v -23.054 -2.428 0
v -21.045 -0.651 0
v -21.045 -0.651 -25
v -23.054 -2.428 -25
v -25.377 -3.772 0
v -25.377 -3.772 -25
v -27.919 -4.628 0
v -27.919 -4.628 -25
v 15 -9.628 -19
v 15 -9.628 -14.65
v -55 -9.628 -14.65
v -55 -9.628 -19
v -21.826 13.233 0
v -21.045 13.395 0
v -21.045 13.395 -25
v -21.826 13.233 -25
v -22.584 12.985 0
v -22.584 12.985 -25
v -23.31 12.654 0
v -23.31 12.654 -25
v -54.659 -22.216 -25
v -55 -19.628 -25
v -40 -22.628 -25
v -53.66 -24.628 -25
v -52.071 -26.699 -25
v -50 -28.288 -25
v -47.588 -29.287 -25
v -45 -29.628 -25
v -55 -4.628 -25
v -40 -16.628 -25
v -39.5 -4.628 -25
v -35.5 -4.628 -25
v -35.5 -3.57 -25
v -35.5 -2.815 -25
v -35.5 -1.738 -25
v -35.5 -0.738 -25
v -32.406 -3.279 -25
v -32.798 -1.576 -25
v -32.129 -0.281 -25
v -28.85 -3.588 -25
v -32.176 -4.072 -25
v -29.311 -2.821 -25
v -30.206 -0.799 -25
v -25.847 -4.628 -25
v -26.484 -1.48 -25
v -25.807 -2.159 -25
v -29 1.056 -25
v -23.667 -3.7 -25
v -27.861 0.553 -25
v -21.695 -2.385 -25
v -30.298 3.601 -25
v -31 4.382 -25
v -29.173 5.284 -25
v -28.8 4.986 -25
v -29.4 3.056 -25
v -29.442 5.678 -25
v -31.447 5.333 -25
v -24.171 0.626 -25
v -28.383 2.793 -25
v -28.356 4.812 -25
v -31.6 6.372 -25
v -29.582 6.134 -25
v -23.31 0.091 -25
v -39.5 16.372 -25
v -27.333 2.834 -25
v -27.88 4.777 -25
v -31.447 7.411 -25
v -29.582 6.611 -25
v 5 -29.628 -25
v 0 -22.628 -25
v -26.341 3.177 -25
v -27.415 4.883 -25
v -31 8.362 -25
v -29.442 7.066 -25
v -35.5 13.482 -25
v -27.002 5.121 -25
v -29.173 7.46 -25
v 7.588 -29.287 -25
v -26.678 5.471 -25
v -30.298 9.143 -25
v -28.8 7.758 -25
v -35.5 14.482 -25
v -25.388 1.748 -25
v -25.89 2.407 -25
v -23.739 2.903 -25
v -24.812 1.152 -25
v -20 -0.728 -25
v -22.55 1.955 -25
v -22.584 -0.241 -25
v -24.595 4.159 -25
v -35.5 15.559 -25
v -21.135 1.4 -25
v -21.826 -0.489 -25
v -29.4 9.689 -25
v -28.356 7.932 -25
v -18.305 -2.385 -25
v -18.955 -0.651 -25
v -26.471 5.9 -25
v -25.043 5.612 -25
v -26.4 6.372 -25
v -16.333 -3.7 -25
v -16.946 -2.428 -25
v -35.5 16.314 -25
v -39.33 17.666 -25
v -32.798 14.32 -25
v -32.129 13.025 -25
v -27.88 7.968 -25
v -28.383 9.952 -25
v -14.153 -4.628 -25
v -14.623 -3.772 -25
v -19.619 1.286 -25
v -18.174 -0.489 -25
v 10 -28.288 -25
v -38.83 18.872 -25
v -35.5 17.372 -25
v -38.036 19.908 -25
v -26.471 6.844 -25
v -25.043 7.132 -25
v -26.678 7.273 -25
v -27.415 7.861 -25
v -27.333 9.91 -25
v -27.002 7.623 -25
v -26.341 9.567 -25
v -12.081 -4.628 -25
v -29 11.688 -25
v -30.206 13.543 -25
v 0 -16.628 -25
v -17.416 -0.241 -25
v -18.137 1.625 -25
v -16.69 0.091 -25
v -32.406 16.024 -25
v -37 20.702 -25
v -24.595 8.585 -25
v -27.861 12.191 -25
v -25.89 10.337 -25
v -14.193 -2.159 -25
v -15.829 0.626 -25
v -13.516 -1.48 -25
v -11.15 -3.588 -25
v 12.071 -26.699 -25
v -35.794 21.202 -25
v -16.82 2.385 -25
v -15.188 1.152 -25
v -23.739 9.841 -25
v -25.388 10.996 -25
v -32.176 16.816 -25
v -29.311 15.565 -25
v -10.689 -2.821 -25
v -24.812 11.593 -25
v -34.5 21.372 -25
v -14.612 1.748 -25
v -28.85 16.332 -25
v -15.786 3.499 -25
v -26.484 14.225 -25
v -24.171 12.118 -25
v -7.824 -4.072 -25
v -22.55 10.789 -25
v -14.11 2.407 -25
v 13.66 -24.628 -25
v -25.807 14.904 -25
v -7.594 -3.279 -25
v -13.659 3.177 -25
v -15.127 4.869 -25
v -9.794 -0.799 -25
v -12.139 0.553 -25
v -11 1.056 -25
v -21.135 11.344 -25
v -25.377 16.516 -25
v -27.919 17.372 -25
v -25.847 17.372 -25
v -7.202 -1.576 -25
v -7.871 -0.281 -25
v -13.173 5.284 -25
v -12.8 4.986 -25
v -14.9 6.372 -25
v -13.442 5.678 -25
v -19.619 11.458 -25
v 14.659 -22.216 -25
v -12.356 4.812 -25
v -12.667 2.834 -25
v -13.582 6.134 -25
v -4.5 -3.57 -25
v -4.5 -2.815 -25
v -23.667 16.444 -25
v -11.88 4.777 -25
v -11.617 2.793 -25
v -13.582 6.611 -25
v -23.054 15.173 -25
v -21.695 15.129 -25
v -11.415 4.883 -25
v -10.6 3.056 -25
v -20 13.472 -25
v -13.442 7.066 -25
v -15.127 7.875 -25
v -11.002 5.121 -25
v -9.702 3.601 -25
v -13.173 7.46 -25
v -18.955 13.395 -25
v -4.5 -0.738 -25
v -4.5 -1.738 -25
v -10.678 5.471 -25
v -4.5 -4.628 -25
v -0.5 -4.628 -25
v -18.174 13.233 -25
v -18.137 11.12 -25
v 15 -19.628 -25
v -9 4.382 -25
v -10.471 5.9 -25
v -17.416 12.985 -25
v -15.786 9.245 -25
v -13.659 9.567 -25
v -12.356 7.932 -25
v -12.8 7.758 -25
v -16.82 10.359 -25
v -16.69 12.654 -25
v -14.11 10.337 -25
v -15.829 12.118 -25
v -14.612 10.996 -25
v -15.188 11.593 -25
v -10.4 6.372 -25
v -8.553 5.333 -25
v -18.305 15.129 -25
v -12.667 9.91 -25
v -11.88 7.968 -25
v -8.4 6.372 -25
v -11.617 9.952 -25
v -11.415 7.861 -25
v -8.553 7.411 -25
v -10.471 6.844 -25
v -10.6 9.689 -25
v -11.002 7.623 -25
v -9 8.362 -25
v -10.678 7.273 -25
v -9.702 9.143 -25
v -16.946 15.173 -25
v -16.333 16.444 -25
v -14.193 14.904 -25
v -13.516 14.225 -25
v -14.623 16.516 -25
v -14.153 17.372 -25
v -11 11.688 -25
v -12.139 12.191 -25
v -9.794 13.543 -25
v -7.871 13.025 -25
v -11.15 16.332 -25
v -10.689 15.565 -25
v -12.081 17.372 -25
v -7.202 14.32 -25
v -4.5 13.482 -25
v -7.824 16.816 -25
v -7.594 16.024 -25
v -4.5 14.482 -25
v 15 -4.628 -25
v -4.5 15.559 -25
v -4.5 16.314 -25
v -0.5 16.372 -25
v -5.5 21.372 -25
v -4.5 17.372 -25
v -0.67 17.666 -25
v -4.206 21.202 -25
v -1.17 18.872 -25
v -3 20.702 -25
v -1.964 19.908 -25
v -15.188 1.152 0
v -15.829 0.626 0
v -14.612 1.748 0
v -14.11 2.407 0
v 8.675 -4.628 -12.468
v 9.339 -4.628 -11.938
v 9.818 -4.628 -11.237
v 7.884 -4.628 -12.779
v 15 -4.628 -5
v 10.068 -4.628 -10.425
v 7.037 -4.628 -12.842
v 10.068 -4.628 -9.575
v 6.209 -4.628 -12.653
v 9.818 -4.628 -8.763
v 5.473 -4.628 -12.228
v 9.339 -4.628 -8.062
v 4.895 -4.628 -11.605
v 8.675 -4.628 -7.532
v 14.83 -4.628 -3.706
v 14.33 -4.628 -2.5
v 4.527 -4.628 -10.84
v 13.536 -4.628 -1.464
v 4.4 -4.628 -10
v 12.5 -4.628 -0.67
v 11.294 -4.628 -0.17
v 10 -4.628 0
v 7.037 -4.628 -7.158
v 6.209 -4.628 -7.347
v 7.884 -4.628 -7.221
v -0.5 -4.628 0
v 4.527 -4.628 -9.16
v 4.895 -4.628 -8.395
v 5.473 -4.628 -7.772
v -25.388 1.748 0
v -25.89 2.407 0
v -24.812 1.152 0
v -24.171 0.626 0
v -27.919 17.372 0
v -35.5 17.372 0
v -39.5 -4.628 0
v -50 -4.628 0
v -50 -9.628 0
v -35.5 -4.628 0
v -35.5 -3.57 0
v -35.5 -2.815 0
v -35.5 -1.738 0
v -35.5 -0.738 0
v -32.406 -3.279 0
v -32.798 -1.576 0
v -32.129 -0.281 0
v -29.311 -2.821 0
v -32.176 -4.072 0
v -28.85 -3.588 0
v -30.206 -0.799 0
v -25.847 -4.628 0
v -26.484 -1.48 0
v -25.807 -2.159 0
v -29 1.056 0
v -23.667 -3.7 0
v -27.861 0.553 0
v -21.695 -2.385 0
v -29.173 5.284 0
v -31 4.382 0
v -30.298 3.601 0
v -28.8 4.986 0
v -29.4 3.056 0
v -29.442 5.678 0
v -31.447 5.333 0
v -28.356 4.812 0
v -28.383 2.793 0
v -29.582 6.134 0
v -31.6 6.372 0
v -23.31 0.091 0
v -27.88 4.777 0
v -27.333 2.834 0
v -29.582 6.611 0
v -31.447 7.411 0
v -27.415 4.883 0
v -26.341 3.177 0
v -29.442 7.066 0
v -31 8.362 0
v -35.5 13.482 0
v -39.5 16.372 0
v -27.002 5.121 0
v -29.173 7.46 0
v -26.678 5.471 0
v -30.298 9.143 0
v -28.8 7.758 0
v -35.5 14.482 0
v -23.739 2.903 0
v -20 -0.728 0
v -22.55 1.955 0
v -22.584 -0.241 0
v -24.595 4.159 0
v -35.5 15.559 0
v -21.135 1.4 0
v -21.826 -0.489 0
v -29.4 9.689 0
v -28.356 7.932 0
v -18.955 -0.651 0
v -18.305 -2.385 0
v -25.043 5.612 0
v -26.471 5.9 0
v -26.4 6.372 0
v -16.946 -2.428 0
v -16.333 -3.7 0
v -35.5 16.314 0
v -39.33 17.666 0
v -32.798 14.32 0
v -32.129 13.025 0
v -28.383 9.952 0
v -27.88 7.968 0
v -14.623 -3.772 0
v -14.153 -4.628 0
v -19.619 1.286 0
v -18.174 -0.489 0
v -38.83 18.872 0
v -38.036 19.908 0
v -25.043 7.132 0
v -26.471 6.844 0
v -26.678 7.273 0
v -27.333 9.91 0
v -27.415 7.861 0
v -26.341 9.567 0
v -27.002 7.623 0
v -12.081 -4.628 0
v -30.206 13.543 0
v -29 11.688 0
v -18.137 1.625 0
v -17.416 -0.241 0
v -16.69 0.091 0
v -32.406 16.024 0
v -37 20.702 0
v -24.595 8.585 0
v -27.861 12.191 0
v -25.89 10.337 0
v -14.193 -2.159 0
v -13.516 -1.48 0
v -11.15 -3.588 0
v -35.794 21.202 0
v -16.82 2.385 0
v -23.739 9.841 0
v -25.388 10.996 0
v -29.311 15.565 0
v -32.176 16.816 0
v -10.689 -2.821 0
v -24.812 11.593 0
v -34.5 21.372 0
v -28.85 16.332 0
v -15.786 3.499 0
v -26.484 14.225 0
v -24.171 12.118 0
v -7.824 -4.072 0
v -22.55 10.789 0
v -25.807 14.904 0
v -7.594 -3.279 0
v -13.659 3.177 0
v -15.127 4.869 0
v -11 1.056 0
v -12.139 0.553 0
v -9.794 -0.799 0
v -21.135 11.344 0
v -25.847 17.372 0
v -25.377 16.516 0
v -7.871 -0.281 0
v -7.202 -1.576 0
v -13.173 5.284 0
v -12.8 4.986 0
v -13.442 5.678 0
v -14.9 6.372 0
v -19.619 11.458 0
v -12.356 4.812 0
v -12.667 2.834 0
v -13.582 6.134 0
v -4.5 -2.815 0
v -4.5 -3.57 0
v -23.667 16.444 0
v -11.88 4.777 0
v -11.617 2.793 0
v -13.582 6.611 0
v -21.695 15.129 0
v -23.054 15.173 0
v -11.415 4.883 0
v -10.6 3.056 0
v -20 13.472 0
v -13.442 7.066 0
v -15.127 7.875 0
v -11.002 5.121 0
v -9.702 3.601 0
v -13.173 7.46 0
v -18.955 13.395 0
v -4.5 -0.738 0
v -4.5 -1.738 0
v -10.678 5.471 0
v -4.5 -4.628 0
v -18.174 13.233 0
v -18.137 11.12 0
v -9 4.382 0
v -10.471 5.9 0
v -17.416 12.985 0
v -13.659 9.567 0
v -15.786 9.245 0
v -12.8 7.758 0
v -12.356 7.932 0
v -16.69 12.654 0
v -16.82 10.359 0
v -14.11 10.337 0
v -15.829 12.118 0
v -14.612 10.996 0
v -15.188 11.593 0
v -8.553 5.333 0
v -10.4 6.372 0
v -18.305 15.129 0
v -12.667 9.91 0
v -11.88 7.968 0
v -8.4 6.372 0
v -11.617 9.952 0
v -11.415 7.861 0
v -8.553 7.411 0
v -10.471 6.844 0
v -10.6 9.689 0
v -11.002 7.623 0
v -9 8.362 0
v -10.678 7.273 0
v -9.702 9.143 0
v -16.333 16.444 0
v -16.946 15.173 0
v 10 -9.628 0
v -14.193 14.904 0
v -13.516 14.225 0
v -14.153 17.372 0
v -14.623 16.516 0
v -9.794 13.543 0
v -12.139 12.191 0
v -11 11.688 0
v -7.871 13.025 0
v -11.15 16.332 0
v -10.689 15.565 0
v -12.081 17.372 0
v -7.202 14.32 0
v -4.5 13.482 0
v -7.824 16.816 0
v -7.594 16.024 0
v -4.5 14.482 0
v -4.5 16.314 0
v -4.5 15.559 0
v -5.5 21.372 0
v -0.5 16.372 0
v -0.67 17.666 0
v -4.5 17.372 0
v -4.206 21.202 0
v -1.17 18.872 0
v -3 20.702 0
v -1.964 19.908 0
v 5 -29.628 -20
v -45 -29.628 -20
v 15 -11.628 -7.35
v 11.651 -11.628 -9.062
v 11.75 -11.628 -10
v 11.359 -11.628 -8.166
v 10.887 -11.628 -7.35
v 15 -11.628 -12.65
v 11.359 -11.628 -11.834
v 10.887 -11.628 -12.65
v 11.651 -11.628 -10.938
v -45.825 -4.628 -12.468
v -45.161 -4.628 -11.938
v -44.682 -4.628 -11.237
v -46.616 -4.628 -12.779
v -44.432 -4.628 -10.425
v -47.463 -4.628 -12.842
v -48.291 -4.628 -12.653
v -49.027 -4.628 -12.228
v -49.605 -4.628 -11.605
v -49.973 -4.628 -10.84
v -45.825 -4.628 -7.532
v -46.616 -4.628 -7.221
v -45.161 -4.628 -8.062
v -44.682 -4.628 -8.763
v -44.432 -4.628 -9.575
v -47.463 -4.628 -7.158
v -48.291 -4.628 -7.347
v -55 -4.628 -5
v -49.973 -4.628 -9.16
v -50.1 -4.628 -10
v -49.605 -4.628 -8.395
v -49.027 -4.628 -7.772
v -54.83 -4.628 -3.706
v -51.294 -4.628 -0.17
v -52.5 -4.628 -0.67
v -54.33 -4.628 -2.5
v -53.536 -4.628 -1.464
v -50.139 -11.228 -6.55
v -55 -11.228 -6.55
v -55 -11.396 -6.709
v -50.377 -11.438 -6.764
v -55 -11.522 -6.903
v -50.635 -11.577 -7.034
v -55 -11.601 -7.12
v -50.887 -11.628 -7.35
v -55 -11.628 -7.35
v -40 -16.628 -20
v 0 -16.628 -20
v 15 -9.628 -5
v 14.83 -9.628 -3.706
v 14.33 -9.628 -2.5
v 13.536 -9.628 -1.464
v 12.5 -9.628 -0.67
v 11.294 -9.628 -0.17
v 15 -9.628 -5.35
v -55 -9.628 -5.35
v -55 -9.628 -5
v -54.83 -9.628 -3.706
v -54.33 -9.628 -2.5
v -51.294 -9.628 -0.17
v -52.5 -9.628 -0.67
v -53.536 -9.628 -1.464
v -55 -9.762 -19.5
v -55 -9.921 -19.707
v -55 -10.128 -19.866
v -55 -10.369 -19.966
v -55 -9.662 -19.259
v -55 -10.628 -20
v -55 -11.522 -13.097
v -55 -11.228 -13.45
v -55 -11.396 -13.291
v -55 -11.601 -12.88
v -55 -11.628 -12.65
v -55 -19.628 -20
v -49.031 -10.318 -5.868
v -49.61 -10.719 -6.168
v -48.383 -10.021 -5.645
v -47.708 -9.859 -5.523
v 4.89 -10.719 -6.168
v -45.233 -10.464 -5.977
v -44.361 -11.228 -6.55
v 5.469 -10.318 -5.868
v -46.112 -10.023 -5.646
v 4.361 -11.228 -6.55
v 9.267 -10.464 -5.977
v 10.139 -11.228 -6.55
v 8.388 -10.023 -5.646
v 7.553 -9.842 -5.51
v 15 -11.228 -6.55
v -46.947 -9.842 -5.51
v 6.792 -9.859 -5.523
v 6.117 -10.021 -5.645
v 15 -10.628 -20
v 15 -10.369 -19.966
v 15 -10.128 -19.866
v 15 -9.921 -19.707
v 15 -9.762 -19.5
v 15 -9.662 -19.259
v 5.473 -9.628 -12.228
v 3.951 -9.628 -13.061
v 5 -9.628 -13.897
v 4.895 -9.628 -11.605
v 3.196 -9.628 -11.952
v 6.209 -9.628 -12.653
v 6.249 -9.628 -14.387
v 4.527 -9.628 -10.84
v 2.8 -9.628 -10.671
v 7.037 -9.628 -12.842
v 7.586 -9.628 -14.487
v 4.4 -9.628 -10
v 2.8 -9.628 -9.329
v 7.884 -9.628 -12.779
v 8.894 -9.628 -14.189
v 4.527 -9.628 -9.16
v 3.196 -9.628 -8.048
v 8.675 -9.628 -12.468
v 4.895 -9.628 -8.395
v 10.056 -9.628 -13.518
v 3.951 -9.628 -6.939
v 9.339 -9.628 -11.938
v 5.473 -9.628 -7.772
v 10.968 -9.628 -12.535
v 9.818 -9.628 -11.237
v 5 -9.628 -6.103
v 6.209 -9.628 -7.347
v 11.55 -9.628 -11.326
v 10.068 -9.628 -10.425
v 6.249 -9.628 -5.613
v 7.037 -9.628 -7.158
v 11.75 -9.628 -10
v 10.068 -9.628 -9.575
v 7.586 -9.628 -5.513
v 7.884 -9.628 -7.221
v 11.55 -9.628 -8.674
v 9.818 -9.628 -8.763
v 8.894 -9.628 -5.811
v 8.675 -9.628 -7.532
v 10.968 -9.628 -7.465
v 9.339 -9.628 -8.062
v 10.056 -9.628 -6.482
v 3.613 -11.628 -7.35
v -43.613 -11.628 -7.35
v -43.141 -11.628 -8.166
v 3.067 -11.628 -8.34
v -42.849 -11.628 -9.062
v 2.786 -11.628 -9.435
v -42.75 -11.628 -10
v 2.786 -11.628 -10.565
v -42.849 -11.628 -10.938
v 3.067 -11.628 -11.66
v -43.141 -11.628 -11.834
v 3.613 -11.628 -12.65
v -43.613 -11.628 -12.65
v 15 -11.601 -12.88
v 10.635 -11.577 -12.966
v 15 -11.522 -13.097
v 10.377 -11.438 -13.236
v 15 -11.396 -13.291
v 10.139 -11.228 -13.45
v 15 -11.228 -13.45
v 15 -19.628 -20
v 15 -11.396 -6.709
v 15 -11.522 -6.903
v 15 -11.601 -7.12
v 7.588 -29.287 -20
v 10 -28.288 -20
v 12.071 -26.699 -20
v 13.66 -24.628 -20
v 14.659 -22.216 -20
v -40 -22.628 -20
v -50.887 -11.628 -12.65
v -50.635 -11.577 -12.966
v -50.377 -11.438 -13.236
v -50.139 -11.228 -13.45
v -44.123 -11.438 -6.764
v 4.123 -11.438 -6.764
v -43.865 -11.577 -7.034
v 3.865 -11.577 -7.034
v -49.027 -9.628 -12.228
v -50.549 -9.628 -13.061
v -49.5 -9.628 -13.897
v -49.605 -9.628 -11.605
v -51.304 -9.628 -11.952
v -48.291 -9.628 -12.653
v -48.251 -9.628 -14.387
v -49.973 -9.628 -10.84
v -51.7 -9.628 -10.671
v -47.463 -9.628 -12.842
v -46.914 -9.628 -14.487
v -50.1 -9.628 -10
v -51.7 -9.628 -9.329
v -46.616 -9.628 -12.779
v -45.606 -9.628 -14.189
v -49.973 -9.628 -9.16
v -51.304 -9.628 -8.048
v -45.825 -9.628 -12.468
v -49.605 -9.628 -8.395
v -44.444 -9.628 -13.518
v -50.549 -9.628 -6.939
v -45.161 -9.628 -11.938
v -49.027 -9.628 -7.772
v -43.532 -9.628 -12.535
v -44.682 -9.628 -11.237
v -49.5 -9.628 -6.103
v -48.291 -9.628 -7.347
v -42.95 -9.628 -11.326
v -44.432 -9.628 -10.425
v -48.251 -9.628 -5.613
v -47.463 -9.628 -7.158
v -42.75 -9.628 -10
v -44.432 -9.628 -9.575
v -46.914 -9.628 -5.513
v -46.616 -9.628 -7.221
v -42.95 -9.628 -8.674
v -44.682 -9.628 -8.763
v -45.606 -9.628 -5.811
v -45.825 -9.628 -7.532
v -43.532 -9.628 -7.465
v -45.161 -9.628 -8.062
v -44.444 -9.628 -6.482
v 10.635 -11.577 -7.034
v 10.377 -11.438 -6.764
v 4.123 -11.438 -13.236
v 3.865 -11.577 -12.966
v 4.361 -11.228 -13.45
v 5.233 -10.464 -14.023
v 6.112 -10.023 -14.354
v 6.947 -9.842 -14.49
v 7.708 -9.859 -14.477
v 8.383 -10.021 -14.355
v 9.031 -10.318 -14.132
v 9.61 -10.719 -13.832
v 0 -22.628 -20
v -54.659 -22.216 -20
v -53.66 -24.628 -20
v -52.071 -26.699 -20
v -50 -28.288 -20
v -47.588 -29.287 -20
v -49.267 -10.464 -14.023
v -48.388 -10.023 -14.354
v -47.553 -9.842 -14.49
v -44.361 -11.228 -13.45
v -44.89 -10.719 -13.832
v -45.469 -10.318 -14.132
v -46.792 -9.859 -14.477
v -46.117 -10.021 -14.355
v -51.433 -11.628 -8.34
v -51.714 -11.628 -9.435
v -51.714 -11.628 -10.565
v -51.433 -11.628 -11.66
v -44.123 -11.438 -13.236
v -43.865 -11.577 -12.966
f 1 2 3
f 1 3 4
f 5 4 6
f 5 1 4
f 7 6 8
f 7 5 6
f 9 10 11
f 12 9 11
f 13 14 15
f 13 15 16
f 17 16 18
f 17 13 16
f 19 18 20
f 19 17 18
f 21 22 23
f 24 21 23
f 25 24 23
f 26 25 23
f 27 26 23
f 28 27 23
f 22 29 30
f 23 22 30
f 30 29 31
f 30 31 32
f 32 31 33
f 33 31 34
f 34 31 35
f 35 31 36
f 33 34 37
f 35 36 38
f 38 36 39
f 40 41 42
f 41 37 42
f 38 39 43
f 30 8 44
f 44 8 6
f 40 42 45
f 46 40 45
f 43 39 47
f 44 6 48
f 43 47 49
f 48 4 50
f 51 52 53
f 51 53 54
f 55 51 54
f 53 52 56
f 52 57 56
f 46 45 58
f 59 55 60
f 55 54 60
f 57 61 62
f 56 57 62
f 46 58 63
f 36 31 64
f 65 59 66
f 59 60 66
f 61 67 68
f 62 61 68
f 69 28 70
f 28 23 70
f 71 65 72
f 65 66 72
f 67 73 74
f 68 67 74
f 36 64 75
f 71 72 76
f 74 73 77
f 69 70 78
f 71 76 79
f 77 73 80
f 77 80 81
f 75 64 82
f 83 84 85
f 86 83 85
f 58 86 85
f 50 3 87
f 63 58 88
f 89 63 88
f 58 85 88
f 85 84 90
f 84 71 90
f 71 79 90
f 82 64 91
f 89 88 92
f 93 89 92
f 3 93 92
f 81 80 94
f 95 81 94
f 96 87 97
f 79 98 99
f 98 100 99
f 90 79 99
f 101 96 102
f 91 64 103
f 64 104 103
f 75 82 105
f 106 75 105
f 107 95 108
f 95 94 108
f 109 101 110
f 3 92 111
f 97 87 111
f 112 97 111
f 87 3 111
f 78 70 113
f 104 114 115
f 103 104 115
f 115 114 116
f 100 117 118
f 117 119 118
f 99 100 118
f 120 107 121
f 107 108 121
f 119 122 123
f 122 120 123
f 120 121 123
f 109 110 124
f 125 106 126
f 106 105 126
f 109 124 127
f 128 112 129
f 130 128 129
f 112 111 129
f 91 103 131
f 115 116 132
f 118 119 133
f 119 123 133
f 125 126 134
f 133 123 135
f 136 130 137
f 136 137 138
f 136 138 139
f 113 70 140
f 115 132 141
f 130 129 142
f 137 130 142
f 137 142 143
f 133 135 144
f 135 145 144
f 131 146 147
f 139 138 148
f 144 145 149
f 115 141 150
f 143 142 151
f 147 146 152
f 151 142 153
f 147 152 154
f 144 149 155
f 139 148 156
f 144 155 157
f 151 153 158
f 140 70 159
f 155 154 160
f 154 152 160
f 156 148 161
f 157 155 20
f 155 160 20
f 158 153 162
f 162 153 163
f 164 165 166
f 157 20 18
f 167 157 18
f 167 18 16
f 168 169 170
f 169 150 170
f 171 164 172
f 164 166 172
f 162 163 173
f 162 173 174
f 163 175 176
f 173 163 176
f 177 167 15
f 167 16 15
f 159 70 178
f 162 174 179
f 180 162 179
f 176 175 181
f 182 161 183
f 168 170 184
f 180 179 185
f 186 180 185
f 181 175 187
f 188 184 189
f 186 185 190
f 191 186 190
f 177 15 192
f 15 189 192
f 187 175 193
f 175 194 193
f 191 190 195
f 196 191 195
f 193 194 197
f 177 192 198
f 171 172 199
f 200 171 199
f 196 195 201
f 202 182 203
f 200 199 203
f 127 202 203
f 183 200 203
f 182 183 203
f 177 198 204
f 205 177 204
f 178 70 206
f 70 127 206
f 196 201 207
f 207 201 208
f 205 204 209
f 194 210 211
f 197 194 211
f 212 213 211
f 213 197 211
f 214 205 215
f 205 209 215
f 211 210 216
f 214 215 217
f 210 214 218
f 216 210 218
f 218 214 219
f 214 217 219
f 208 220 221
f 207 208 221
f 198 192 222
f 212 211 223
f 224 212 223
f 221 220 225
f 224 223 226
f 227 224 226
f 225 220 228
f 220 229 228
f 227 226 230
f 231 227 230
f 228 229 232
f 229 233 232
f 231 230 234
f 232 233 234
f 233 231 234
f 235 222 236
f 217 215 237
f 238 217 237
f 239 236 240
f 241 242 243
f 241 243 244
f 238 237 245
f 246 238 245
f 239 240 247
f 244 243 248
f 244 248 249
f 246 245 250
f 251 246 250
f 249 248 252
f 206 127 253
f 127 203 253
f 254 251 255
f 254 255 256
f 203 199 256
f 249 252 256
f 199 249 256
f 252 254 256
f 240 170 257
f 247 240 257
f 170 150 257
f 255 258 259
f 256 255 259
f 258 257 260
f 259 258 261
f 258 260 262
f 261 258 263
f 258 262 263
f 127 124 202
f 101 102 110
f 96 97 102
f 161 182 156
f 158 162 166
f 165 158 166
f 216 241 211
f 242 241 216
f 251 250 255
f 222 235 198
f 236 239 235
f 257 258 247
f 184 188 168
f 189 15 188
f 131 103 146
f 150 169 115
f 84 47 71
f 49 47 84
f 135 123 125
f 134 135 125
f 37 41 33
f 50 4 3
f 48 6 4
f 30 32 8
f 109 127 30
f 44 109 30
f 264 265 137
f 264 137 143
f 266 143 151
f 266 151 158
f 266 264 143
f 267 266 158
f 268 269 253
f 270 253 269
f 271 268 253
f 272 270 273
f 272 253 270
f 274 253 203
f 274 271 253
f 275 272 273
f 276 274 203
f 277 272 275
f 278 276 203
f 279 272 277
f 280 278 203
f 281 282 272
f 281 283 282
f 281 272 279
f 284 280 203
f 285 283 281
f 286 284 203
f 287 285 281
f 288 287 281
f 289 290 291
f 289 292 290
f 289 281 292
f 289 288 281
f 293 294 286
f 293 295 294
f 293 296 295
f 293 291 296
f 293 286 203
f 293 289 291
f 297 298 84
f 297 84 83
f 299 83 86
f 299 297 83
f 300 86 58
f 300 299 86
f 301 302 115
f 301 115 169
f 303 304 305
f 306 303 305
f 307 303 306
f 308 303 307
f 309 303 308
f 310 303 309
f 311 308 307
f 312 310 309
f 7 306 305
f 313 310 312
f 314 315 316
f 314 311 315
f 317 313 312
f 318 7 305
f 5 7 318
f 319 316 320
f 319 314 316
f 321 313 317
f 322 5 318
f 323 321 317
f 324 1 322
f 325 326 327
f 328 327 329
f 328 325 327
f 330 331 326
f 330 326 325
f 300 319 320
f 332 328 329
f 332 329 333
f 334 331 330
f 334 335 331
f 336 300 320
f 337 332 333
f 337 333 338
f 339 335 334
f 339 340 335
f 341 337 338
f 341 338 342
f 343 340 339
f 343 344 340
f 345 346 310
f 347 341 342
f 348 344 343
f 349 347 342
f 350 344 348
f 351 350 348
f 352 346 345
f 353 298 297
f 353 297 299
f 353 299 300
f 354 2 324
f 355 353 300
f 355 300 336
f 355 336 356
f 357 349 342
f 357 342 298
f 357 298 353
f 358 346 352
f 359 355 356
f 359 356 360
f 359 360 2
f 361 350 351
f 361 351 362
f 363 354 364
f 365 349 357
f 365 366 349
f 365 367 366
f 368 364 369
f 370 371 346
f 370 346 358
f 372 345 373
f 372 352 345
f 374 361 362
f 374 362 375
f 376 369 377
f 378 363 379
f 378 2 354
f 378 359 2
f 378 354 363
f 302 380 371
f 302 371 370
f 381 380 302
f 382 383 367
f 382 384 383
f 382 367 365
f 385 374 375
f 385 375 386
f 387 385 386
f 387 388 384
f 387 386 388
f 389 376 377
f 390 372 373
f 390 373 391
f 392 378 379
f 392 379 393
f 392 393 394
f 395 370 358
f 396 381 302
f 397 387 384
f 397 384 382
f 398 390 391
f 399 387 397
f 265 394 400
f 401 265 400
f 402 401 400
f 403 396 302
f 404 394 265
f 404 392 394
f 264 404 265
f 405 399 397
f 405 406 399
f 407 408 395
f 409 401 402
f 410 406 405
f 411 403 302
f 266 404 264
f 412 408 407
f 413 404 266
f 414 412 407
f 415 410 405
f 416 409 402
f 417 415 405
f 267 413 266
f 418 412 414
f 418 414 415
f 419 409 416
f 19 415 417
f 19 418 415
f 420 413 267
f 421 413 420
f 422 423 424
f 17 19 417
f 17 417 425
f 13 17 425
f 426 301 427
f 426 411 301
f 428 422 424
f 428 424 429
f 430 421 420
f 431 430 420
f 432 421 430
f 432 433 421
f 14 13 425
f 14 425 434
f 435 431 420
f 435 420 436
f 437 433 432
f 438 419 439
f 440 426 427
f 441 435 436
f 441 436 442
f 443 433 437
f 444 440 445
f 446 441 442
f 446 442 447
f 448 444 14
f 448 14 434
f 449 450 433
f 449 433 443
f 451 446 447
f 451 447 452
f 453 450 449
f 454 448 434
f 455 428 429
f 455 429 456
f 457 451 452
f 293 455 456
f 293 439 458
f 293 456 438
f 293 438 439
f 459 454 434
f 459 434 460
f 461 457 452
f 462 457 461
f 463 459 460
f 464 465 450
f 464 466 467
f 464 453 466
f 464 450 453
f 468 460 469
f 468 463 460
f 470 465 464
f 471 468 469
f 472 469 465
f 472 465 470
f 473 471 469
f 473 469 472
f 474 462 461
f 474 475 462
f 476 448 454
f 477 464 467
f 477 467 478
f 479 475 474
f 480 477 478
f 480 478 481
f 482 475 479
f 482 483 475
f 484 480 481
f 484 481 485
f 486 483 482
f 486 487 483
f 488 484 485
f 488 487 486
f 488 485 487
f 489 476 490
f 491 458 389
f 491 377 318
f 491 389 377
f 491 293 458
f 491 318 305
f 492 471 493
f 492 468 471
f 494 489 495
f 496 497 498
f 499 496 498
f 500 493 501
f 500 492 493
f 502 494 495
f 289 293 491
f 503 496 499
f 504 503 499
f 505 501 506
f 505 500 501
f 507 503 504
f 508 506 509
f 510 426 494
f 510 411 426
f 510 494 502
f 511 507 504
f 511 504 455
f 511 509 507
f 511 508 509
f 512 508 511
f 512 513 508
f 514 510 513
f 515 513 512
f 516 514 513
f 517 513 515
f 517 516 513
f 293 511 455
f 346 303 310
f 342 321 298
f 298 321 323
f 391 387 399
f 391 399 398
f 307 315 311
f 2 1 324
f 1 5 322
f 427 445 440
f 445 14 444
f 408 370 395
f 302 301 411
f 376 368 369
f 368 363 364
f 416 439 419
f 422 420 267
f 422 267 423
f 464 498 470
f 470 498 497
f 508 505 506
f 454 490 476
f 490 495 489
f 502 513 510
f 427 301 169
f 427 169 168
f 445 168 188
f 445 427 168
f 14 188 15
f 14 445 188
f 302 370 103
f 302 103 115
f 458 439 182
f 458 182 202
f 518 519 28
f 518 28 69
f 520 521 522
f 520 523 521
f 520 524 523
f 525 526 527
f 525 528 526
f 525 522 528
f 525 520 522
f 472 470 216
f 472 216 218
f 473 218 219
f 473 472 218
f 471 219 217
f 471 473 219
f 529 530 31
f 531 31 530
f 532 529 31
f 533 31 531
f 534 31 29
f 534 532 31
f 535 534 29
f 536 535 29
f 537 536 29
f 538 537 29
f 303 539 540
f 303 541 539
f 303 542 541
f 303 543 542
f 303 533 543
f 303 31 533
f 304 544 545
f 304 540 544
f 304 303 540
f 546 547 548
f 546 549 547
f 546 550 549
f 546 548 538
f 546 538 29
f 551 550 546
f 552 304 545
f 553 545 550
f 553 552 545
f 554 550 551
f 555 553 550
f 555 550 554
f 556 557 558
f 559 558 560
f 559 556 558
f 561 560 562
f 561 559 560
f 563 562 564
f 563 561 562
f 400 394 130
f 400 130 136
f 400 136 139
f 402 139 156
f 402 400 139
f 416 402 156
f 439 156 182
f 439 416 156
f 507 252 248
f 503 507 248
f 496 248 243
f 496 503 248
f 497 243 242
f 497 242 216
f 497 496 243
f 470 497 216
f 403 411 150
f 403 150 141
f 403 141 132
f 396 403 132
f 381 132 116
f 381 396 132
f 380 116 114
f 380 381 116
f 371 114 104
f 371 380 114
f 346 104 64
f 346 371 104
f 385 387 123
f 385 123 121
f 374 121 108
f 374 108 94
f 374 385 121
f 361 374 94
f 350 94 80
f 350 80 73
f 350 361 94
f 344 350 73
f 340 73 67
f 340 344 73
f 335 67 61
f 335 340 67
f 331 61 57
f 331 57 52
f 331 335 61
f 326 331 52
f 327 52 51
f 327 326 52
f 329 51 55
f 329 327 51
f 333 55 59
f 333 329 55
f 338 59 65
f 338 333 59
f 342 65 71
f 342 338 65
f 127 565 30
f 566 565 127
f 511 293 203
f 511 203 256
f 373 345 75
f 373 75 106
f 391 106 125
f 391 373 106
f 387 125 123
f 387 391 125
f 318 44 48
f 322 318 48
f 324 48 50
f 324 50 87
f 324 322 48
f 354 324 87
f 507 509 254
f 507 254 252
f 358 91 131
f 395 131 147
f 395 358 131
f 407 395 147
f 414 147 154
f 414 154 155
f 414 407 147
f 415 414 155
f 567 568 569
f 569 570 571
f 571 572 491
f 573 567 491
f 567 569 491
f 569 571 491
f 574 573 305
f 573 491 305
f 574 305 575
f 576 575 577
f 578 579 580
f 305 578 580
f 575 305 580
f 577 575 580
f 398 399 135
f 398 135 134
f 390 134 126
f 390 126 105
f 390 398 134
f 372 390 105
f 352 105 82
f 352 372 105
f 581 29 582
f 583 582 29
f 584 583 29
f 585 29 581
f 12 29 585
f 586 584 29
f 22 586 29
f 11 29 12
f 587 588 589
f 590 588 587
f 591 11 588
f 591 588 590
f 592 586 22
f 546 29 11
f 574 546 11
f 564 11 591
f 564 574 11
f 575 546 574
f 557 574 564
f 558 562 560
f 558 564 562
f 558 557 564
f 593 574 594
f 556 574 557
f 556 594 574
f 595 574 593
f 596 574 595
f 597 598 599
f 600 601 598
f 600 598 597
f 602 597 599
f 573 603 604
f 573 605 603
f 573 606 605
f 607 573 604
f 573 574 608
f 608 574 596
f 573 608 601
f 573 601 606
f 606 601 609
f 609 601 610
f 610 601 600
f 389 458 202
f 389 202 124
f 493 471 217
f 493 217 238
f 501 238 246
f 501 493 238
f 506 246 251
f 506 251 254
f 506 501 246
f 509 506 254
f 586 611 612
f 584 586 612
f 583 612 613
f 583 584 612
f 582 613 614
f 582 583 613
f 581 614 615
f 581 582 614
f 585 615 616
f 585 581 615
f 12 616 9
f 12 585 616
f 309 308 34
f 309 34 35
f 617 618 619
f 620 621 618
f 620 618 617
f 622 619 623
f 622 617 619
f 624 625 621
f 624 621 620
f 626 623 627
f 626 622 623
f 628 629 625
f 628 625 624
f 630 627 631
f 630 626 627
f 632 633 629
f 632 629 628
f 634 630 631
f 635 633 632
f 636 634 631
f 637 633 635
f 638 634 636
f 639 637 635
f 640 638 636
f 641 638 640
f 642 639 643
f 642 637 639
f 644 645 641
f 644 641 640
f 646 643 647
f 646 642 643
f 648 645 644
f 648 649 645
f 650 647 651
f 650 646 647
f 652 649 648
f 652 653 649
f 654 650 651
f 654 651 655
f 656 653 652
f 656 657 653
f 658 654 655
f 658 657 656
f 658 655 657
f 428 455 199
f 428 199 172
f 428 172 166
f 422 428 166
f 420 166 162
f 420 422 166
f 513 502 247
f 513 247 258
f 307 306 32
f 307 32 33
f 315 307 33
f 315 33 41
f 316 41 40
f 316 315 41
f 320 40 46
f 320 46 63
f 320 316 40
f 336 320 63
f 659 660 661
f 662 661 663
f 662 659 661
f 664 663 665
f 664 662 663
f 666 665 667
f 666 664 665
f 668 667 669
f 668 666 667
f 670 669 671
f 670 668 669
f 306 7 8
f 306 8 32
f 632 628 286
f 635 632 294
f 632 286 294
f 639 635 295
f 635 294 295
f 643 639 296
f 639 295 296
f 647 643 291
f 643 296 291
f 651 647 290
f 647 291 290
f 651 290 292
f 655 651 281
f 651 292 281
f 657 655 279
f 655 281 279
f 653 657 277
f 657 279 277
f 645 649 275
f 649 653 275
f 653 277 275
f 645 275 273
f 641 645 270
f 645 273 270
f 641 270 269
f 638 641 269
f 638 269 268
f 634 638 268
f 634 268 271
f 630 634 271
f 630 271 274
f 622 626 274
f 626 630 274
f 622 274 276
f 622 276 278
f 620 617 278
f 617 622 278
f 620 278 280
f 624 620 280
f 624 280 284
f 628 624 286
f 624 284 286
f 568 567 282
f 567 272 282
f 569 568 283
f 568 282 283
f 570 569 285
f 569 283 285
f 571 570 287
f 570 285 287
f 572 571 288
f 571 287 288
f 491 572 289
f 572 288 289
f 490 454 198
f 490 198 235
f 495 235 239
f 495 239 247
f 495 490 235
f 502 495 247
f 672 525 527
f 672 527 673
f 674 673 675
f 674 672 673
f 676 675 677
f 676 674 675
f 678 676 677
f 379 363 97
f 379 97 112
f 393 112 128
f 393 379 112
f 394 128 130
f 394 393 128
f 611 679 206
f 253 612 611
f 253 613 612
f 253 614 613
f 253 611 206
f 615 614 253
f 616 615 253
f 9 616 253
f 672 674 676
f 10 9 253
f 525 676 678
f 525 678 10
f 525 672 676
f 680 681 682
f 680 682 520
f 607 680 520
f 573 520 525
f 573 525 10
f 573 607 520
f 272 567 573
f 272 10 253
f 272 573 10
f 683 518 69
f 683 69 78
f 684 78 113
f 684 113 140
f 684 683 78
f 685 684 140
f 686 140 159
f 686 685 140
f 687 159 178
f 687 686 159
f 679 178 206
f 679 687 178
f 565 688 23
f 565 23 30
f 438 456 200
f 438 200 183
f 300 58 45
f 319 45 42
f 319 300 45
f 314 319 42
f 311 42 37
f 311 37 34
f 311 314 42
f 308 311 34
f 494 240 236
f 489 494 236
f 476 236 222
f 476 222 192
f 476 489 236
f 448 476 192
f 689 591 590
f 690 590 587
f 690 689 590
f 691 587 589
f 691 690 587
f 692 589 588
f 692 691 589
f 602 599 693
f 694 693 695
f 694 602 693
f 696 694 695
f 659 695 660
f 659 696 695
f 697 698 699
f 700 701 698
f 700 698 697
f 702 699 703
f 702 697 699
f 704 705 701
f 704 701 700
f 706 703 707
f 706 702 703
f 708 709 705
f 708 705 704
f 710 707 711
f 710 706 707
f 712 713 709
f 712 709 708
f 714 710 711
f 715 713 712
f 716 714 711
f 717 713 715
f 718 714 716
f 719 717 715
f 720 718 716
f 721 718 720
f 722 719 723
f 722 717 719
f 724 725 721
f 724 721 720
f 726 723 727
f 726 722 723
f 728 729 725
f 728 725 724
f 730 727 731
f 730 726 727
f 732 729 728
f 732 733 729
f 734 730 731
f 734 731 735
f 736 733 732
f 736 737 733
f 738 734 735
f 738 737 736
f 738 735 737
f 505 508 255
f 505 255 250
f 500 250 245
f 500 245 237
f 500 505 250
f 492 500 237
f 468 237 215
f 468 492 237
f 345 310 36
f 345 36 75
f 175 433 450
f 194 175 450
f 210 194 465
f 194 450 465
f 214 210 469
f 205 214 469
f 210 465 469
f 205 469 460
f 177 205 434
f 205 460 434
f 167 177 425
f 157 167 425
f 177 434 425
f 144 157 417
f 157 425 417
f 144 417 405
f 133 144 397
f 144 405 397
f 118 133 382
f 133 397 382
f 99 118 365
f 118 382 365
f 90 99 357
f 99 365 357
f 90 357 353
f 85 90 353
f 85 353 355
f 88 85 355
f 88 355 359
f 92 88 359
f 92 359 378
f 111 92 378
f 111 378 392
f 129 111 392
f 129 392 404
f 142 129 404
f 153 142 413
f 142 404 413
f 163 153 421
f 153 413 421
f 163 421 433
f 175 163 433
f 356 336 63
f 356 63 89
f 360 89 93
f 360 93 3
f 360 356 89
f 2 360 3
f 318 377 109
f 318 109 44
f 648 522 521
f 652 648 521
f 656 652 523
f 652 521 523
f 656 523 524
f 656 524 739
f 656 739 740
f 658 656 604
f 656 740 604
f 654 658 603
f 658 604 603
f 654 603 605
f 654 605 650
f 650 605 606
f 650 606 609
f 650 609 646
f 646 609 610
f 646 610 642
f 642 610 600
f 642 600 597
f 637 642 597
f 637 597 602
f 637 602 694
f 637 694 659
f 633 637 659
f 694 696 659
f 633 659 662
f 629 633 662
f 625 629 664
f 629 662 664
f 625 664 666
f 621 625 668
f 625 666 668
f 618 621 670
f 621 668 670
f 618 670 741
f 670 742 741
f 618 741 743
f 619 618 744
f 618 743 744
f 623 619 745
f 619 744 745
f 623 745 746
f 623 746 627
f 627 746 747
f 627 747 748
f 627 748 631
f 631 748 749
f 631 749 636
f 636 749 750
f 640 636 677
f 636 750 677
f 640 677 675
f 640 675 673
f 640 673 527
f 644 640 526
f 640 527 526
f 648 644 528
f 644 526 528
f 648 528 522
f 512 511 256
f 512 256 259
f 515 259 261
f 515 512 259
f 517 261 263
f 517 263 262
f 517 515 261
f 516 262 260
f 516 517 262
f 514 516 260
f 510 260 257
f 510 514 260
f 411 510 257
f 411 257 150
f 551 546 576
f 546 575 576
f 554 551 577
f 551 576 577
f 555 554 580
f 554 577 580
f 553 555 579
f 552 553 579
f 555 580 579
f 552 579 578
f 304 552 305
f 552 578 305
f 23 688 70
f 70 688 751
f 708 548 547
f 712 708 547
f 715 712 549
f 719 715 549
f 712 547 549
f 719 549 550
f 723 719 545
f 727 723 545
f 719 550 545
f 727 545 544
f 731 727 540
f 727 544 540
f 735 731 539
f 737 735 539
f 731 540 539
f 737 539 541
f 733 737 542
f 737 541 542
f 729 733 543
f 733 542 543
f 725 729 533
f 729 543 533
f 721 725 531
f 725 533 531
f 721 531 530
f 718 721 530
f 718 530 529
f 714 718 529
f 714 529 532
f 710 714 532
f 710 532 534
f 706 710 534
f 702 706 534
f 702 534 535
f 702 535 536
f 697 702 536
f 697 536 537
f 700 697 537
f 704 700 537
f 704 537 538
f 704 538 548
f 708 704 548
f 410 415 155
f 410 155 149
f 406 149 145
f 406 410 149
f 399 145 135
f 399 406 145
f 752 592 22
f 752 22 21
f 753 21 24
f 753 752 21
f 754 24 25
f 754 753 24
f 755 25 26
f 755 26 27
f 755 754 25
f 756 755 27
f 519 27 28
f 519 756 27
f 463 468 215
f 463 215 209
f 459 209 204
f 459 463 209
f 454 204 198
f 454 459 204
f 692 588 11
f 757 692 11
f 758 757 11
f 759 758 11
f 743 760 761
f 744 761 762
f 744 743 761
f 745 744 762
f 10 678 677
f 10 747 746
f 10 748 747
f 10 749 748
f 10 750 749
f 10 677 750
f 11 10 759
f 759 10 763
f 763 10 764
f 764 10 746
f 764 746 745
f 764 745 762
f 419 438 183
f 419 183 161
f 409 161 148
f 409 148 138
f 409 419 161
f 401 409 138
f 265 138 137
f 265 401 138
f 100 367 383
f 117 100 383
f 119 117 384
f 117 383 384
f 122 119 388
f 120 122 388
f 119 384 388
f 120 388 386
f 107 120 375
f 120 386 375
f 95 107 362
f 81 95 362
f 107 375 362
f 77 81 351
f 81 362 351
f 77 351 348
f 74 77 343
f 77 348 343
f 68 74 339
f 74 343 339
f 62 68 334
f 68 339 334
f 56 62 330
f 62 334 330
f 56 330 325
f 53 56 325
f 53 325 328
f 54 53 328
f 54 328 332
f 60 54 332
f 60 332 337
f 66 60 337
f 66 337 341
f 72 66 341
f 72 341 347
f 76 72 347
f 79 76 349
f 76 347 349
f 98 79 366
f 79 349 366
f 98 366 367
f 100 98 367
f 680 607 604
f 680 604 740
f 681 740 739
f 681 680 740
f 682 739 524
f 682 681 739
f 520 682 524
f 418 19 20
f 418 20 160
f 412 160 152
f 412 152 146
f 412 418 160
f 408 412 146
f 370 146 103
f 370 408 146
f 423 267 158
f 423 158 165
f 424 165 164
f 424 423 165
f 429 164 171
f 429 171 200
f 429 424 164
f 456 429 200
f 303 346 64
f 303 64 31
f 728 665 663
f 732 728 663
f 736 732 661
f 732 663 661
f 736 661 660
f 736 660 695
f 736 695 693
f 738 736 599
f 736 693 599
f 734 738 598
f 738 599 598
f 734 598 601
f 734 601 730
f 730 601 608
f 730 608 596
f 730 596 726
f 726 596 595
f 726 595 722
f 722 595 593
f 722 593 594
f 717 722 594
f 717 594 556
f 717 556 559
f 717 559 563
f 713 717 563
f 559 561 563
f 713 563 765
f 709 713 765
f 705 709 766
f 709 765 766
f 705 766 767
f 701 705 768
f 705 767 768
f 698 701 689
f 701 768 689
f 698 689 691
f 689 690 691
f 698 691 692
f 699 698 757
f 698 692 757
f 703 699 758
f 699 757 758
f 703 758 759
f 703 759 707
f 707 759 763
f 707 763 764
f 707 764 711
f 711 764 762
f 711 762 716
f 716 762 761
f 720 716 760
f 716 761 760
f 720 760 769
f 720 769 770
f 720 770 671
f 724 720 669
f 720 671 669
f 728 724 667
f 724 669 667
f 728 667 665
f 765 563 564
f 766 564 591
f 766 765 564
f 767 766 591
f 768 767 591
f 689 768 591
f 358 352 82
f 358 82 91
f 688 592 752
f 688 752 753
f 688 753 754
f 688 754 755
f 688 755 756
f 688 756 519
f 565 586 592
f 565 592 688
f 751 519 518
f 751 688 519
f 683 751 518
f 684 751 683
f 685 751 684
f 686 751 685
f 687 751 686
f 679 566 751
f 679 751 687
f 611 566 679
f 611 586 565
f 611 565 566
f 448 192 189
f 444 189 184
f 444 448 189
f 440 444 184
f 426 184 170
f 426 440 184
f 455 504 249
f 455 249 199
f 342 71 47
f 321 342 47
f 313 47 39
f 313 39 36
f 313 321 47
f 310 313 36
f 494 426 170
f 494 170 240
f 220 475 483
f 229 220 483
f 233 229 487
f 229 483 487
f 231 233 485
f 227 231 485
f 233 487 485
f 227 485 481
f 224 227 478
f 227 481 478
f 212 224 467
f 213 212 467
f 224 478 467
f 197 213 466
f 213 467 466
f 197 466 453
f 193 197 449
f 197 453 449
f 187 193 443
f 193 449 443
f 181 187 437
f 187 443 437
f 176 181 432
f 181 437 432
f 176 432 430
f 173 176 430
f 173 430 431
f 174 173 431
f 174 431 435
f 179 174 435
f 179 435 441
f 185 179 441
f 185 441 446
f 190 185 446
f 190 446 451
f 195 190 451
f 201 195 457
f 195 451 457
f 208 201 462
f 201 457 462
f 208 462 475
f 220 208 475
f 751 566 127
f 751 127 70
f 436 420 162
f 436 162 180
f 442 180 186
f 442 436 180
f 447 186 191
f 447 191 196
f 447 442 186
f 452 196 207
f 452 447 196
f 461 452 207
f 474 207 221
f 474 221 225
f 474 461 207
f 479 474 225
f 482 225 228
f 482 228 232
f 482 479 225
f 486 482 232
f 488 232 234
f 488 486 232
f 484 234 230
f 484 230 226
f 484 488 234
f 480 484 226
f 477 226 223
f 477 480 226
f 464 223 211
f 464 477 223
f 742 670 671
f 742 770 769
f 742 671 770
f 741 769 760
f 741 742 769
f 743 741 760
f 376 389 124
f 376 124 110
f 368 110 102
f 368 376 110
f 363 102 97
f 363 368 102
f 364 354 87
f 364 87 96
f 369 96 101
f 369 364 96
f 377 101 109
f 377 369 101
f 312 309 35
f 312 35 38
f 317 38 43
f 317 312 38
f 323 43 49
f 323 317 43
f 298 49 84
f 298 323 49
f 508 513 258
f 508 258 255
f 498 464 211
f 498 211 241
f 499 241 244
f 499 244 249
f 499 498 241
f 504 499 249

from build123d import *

# Parameters (mm, degrees)
F0_W     = 15
F0_H     = 5
F0_W_2   = 40
F0_H_2   = 7
F0_R     = 1.6
F0_R_2   = 5.1
F1_DEPTH = 25
F2_DEPTH = 20
F5_DEPTH = 70
F3_R     = 2.85
F6_DEPTH = 25.001
F7_R     = 4.5
F7_R_2   = 2.85
F8_DEPTH = 2
F9_R     = 5
F10_R    = 1


# Not quite as in the source:
# - ends of sketch curves that miss each other by under 0.0002 mm in the source are joined
# - a feature names something its author has since deleted; it is built from what else it names


with BuildPart() as f1:
    # F0 (on Top) → F1 (new body)
    with BuildSketch(Plane.XY):
        with Locations((-47.5, -7.1279055323)):
            Rectangle(F0_W, F0_H)
        with Locations((7.5, -7.1279055323)):
            Rectangle(F0_W, F0_H)
        with Locations((-20, -26.1279055323)):
            Rectangle(F0_W_2, F0_H_2)
        with BuildLine():
            ThreePointArc((-13.6593749135, 9.5668516592), (-9.4804951392, 12.4620627067), (-4.5000003888, 13.481844654))
            Line((-4.5000003888, 13.481844654), (-4.5000003888, 14.481844654))
            ThreePointArc((-4.5000003888, 14.481844654), (-9.793949685, 13.5428339695), (-14.1101168945, 10.3368488111))
            ThreePointArc((-14.1101168945, 10.3368488111), (-13.872638695, 9.9589375697), (-13.6593749135, 9.5668516592))
        make_face()
        with BuildLine():
            ThreePointArc((-15.8291388207, 12.1178683079), (-10.6891300848, 15.5654287884), (-4.5000003888, 15.5593724921))
            Line((-4.5000003888, 15.5593724921), (-4.5000003888, 16.3141830726))
            ThreePointArc((-4.5000003888, 16.3141830726), (-11.1501915503, 16.3321080887), (-16.6903423933, 12.6535088408))
            ThreePointArc((-16.6903423933, 12.6535088408), (-16.2501642673, 12.4010854262), (-15.8291388207, 12.1178683079))
        make_face()
        with BuildLine():
            ThreePointArc((-18.9549587768, 13.3947641055), (-15.8181752362, 15.9024378017), (-12.0808034818, 17.3720944677))
            Line((-12.0808034818, 17.3720944677), (-14.1525114111, 17.3720944677))
            ThreePointArc((-14.1525114111, 17.3720944677), (-17.3497652419, 15.8321825785), (-20.0000000983, 13.4720944677))
            ThreePointArc((-20, 13.4720944677), (-19.4760507794, 13.4527354849), (-18.9549587768, 13.3947641055))
        make_face()
        with BuildLine():
            Line((-25.8474885889, 17.3720944677), (-27.9191965182, 17.3720944677))
            ThreePointArc((-27.9191965182, 17.3720944677), (-24.1818247638, 15.9024378017), (-21.0450412232, 13.3947641055))
            ThreePointArc((-21.0450412232, 13.3947641055), (-20.5239492206, 13.4527354849), (-20, 13.4720944677))
            ThreePointArc((-19.9999999017, 13.4720944677), (-22.6502347581, 15.8321825785), (-25.8474885889, 17.3720944677))
        make_face()
        with BuildLine():
            Line((-35.4999996112, 16.3141830726), (-35.4999996112, 15.5593724921))
            ThreePointArc((-35.4999996112, 15.5593724921), (-29.3108699152, 15.5654287884), (-24.1708611793, 12.1178683079))
            ThreePointArc((-24.1708611793, 12.1178683079), (-23.7498357327, 12.4010854262), (-23.3096576067, 12.6535088408))
            ThreePointArc((-23.3096576067, 12.6535088408), (-28.8498084497, 16.3321080887), (-35.4999996112, 16.3141830726))
        make_face()
        with BuildLine():
            Line((-35.4999996112, 14.481844654), (-35.4999996112, 13.481844654))
            ThreePointArc((-35.4999996112, 13.481844654), (-30.5195048608, 12.4620627067), (-26.3406250865, 9.5668516592))
            ThreePointArc((-26.3406250865, 9.5668516592), (-26.1273613547, 9.9589374848), (-25.8898831055, 10.3368488111))
            ThreePointArc((-25.8898831055, 10.3368488111), (-30.206050315, 13.5428339695), (-35.4999996112, 14.481844654))
        make_face()
        with BuildLine():
            Line((-35.4999996112, -0.7376557186), (-35.4999996112, -1.7376557186))
            ThreePointArc((-35.4999996112, -1.7376557186), (-30.206050315, -0.7986450341), (-25.8898831055, 2.4073401243))
            ThreePointArc((-25.8898831055, 2.4073401243), (-26.1273613547, 2.7852514506), (-26.340625175, 3.1773374518))
            ThreePointArc((-26.340625175, 3.1773374518), (-30.5195048608, 0.2821262287), (-35.4999996112, -0.7376557186))
        make_face()
        with BuildLine():
            Line((-35.4999996112, -2.8151835567), (-35.4999996112, -3.5699941372))
            ThreePointArc((-35.4999996112, -3.5699941372), (-28.8498084497, -3.5879191533), (-23.3096576067, 0.0906800946))
            ThreePointArc((-23.3096576067, 0.0906800946), (-23.7498357327, 0.3431035092), (-24.1708611793, 0.6263206275))
            ThreePointArc((-24.1708611793, 0.6263206275), (-29.3108699152, -2.821239853), (-35.4999996112, -2.8151835567))
        make_face()
        with BuildLine():
            ThreePointArc((-16.6903423933, 0.0906800946), (-11.1501915503, -3.5879191533), (-4.5000003888, -3.5699941372))
            Line((-4.5000003888, -3.5699941372), (-4.5000003888, -2.8151835567))
            ThreePointArc((-4.5000003888, -2.8151835567), (-10.6891300848, -2.821239853), (-15.8291388207, 0.6263206275))
            ThreePointArc((-15.8291388207, 0.6263206275), (-16.2501642673, 0.3431035092), (-16.6903423933, 0.0906800946))
        make_face()
        with BuildLine():
            ThreePointArc((-14.1101168945, 2.4073401243), (-9.793949685, -0.7986450341), (-4.5000003888, -1.7376557186))
            Line((-4.5000003888, -1.7376557186), (-4.5000003888, -0.7376557186))
            ThreePointArc((-4.5000003888, -0.7376557186), (-9.4804951392, 0.2821262287), (-13.6593749135, 3.1773372762))
            ThreePointArc((-13.6593749135, 3.1773372762), (-13.872638695, 2.7852513658), (-14.1101168945, 2.4073401243))
        make_face()
        with BuildLine():
            Line((-45, -29.6279055323), (-40, -29.6279055323))
            Line((-40, -29.6279055323), (-40, -22.6279055323))
            Line((-40, -22.6279055323), (-40, -16.6279055323))
            Line((-40, -16.6279055323), (-40, -9.6279055323))
            Line((-40, -9.6279055323), (-55, -9.6279055323))
            Line((-55, -9.6279055323), (-55, -19.6279055323))
            ThreePointArc((-55, -19.6279055323), (-52.0710678119, -26.6989733442), (-45, -29.6279055323))
        make_face()
        with BuildLine():
            Line((0, -22.6279055323), (0, -29.6279055323))
            Line((0, -29.6279055323), (5, -29.6279055323))
            ThreePointArc((5, -29.6279055323), (12.0710678119, -26.6989733442), (15, -19.6279055323))
            Line((15, -19.6279055323), (15, -9.6279055323))
            Line((15, -9.6279055323), (0, -9.6279055323))
            Line((0, -9.6279055323), (0, -16.6279055323))
            Line((0, -16.6279055323), (0, -22.6279055323))
        make_face()
        Polygon((-40, -4.6279055323), (-40, -9.6279055323), (0, -9.6279055323), (0, -4.6279055323), (-0.5000019073, -4.6279055323), (-4.5000003888, -4.6279055323), (-12.0808034818, -4.6279055323), (-14.1525114111, -4.6279055323), (-25.8474885889, -4.6279055323), (-27.9191965182, -4.6279055323), (-35.4999996112, -4.6279055323), (-39.4999980927, -4.6279055323), align=None)
        with BuildLine():
            ThreePointArc((-23.3096576067, 0.0906800946), (-22.2086682224, -0.3756299401), (-21.0450412232, -0.6505751701))
            ThreePointArc((-21.0450412232, -0.6505751701), (-20.5239492206, -0.7085465495), (-20, -0.7279055323))
            ThreePointArc((-20, -0.7279055323), (-19.4760507794, -0.7085465495), (-18.9549587768, -0.6505751701))
            ThreePointArc((-18.9549587768, -0.6505751701), (-17.7913317776, -0.3756299401), (-16.6903423933, 0.0906800946))
            ThreePointArc((-16.6903423933, 0.0906800946), (-16.2501642673, 0.3431035092), (-15.8291388207, 0.6263206275))
            ThreePointArc((-15.8291388207, 0.6263206275), (-14.8914139429, 1.4413390999), (-14.1101168945, 2.4073401243))
            ThreePointArc((-14.1101168945, 2.4073401243), (-13.872638695, 2.7852513658), (-13.6593749135, 3.1773372762))
            ThreePointArc((-13.6593749135, 3.1773372762), (-8.4000001922, 6.3720944677), (-13.6593749135, 9.5668516592))
            ThreePointArc((-13.6593749135, 9.5668516592), (-13.872638695, 9.9589375697), (-14.1101168945, 10.3368488111))
            ThreePointArc((-14.1101168945, 10.3368488111), (-14.8914139429, 11.3028498355), (-15.8291388207, 12.1178683079))
            ThreePointArc((-15.8291388207, 12.1178683079), (-16.2501642673, 12.4010854262), (-16.6903423933, 12.6535088408))
            ThreePointArc((-16.6903423933, 12.6535088408), (-17.7913317776, 13.1198188755), (-18.9549587768, 13.3947641055))
            ThreePointArc((-18.9549587768, 13.3947641055), (-19.4760507794, 13.4527354849), (-20, 13.4720944677))
            ThreePointArc((-20, 13.4720944677), (-20.5239492206, 13.4527354849), (-21.0450412232, 13.3947641055))
            ThreePointArc((-21.0450412232, 13.3947641055), (-22.2086682224, 13.1198188755), (-23.3096576067, 12.6535088408))
            ThreePointArc((-23.3096576067, 12.6535088408), (-23.7498357327, 12.4010854262), (-24.1708611793, 12.1178683079))
            ThreePointArc((-24.1708611793, 12.1178683079), (-25.1085860571, 11.3028498355), (-25.8898831055, 10.3368488111))
            ThreePointArc((-25.8898831055, 10.3368488111), (-26.1273613547, 9.9589374848), (-26.340625175, 9.5668514836))
            ThreePointArc((-26.340625175, 9.5668514836), (-31.5999996112, 6.3720944677), (-26.340625175, 3.1773374518))
            ThreePointArc((-26.340625175, 3.1773374518), (-26.1273613547, 2.7852514506), (-25.8898831055, 2.4073401243))
            ThreePointArc((-25.8898831055, 2.4073401243), (-25.1085860571, 1.4413390999), (-24.1708611793, 0.6263206275))
            ThreePointArc((-24.1708611793, 0.6263206275), (-23.7498357327, 0.3431035092), (-23.3096576067, 0.0906800946))
        make_face()
        with Locations((-28, 6.3720944677)):
            Circle(F0_R, mode=Mode.SUBTRACT)
        with Locations((-20, 6.3720944677)):
            Circle(F0_R_2, mode=Mode.SUBTRACT)
        with Locations((-12, 6.3720944677)):
            Circle(F0_R, mode=Mode.SUBTRACT)
        with BuildLine():
            Line((-14.1525114111, -4.6279055323), (-12.0808034818, -4.6279055323))
            ThreePointArc((-12.0808034818, -4.6279055323), (-15.8181752362, -3.1582488663), (-18.9549587768, -0.6505751701))
            ThreePointArc((-18.9549587768, -0.6505751701), (-19.4760507794, -0.7085465495), (-20, -0.7279055323))
            ThreePointArc((-20.0000000983, -0.7279055323), (-17.3497652419, -3.0879936431), (-14.1525114111, -4.6279055323))
        make_face()
        with BuildLine():
            ThreePointArc((-21.0450412232, -0.6505751701), (-24.1818247638, -3.1582488663), (-27.9191965182, -4.6279055323))
            Line((-27.9191965182, -4.6279055323), (-25.8474885889, -4.6279055323))
            ThreePointArc((-25.8474885889, -4.6279055323), (-22.6502347581, -3.0879936431), (-19.9999999017, -0.7279055323))
            ThreePointArc((-20, -0.7279055323), (-20.5239492206, -0.7085465495), (-21.0450412232, -0.6505751701))
        make_face()
        with BuildLine():
            Line((-39.4999980927, 16.3720929492), (-39.4999980927, -4.6279055323))
            Line((-39.4999980927, -4.6279055323), (-35.4999996112, -4.6279055323))
            Line((-35.4999996112, -4.6279055323), (-35.4999996112, -3.5699941372))
            Line((-35.4999996112, -3.5699941372), (-35.4999996112, -2.8151835567))
            Line((-35.4999996112, -2.8151835567), (-35.4999996112, -1.7376557186))
            Line((-35.4999996112, -1.7376557186), (-35.4999996112, -0.7376557186))
            Line((-35.4999996112, -0.7376557186), (-35.4999996112, 13.481844654))
            Line((-35.4999996112, 13.481844654), (-35.4999996112, 14.481844654))
            Line((-35.4999996112, 14.481844654), (-35.4999996112, 15.5593724921))
            Line((-35.4999996112, 15.5593724921), (-35.4999996112, 16.3141830726))
            Line((-35.4999996112, 16.3141830726), (-35.4999996112, 17.3720944677))
            Line((-35.4999996112, 17.3720944677), (-27.9191965182, 17.3720944677))
            Line((-27.9191965182, 17.3720944677), (-25.8474885889, 17.3720944677))
            Line((-25.8474885889, 17.3720944677), (-14.1525114111, 17.3720944677))
            Line((-14.1525114111, 17.3720944677), (-12.0808034818, 17.3720944677))
            Line((-12.0808034818, 17.3720944677), (-4.5000003888, 17.3720944677))
            Line((-4.5000003888, 17.3720944677), (-4.5000003888, 16.3141830726))
            Line((-4.5000003888, 16.3141830726), (-4.5000003888, 15.5593724921))
            Line((-4.5000003888, 15.5593724921), (-4.5000003888, 14.481844654))
            Line((-4.5000003888, 14.481844654), (-4.5000003888, 13.481844654))
            Line((-4.5000003888, 13.481844654), (-4.5000003888, -0.7376557186))
            Line((-4.5000003888, -0.7376557186), (-4.5000003888, -1.7376557186))
            Line((-4.5000003888, -1.7376557186), (-4.5000003888, -2.8151835567))
            Line((-4.5000003888, -2.8151835567), (-4.5000003888, -3.5699941372))
            Line((-4.5000003888, -3.5699941372), (-4.5000003888, -4.6279055323))
            Line((-4.5000003888, -4.6279055323), (-0.5000019073, -4.6279055323))
            Line((-0.5000019073, -4.6279055323), (-0.5000019073, 16.3720929492))
            ThreePointArc((-0.5000019073, 16.3720929492), (-1.9644680014, 19.9076268551), (-5.5000019073, 21.3720929492))
            Line((-5.5000019073, 21.3720929492), (-34.4999980927, 21.3720929492))
            ThreePointArc((-34.4999980927, 21.3720929492), (-38.0355319986, 19.9076268551), (-39.4999980927, 16.3720929492))
        make_face()
        with Locations((-20, -13.1279055323)):
            Rectangle(F0_W_2, F0_H_2)
    extrude(amount=-F1_DEPTH)

    # F0 (on Top) → F2 (cut)
    with BuildSketch(Plane.XY):
        with Locations((-20, -26.1279055323)):
            Rectangle(F0_W_2, F0_H_2)
        with BuildLine():
            Line((-45, -29.6279055323), (-40, -29.6279055323))
            Line((-40, -29.6279055323), (-40, -22.6279055323))
            Line((-40, -22.6279055323), (-40, -16.6279055323))
            Line((-40, -16.6279055323), (-40, -9.6279055323))
            Line((-40, -9.6279055323), (-55, -9.6279055323))
            Line((-55, -9.6279055323), (-55, -19.6279055323))
            ThreePointArc((-55, -19.6279055323), (-52.0710678119, -26.6989733442), (-45, -29.6279055323))
        make_face()
        with BuildLine():
            Line((0, -22.6279055323), (0, -29.6279055323))
            Line((0, -29.6279055323), (5, -29.6279055323))
            ThreePointArc((5, -29.6279055323), (12.0710678119, -26.6989733442), (15, -19.6279055323))
            Line((15, -19.6279055323), (15, -9.6279055323))
            Line((15, -9.6279055323), (0, -9.6279055323))
            Line((0, -9.6279055323), (0, -16.6279055323))
            Line((0, -16.6279055323), (0, -22.6279055323))
        make_face()
        with Locations((-20, -13.1279055323)):
            Rectangle(F0_W_2, F0_H_2)
    extrude(amount=-F2_DEPTH, mode=Mode.SUBTRACT)

    # F4 (on face) → F5 (join, through all)
    with BuildSketch(Plane.YZ.offset(15)):
        with BuildLine():
            Line((-11.6279055323, -7.35), (-11.6279055323, -10))
            Line((-11.6279055323, -10), (-11.6279055323, -12.65))
            ThreePointArc((-11.6279055323, -12.65), (-11.5223327233, -13.0972135955), (-11.2279055323, -13.45))
            Line((-11.2279055323, -13.45), (-9.6279055323, -14.65))
            Line((-9.6279055323, -14.65), (-9.6279055323, -10))
            Line((-9.6279055323, -10), (-9.6279055323, -5.35))
            Line((-9.6279055323, -5.35), (-11.2279055323, -6.55))
            ThreePointArc((-11.2279055323, -6.55), (-11.5223327233, -6.9027864045), (-11.6279055323, -7.35))
        make_face()
    extrude(amount=-F5_DEPTH)

    # F3 (on face) → F6 (cut, through all)
    with BuildSketch(Plane(origin=(0, -4.6279055323, 0), x_dir=(-1, 0, 0), z_dir=(0, 1, 0))):
        with Locations((47.2499990463, -10)):
            Circle(F3_R)
        with Locations((-7.2499990463, -10)):
            Circle(F3_R)
    extrude(amount=-F6_DEPTH, mode=Mode.SUBTRACT)

    # F7 (on face) → F8 (cut, through all)
    with BuildSketch(Plane.XZ.offset(11.6279055323)):
        with Locations((7.2499990463, -10)):
            Circle(F7_R)
        with Locations((7.2499990463, -10)):
            Circle(F7_R_2, mode=Mode.SUBTRACT)
        with Locations((-47.2499990463, -10)):
            Circle(F7_R)
    extrude(amount=-F8_DEPTH, mode=Mode.SUBTRACT)

    # F9
    f9_edges = [f1.edges().sort_by_distance(p)[0] for p in [
        (15, -7.127906, 0),
        (-55, -7.127906, 0),
    ]]
    fillet(f9_edges, radius=F9_R)

    # F10
    f10_edges = [f1.edges().sort_by_distance(p)[0] for p in [
        (-20, -9.627906, -20),
    ]]
    fillet(f10_edges, radius=F10_R)


solid = f1.part
